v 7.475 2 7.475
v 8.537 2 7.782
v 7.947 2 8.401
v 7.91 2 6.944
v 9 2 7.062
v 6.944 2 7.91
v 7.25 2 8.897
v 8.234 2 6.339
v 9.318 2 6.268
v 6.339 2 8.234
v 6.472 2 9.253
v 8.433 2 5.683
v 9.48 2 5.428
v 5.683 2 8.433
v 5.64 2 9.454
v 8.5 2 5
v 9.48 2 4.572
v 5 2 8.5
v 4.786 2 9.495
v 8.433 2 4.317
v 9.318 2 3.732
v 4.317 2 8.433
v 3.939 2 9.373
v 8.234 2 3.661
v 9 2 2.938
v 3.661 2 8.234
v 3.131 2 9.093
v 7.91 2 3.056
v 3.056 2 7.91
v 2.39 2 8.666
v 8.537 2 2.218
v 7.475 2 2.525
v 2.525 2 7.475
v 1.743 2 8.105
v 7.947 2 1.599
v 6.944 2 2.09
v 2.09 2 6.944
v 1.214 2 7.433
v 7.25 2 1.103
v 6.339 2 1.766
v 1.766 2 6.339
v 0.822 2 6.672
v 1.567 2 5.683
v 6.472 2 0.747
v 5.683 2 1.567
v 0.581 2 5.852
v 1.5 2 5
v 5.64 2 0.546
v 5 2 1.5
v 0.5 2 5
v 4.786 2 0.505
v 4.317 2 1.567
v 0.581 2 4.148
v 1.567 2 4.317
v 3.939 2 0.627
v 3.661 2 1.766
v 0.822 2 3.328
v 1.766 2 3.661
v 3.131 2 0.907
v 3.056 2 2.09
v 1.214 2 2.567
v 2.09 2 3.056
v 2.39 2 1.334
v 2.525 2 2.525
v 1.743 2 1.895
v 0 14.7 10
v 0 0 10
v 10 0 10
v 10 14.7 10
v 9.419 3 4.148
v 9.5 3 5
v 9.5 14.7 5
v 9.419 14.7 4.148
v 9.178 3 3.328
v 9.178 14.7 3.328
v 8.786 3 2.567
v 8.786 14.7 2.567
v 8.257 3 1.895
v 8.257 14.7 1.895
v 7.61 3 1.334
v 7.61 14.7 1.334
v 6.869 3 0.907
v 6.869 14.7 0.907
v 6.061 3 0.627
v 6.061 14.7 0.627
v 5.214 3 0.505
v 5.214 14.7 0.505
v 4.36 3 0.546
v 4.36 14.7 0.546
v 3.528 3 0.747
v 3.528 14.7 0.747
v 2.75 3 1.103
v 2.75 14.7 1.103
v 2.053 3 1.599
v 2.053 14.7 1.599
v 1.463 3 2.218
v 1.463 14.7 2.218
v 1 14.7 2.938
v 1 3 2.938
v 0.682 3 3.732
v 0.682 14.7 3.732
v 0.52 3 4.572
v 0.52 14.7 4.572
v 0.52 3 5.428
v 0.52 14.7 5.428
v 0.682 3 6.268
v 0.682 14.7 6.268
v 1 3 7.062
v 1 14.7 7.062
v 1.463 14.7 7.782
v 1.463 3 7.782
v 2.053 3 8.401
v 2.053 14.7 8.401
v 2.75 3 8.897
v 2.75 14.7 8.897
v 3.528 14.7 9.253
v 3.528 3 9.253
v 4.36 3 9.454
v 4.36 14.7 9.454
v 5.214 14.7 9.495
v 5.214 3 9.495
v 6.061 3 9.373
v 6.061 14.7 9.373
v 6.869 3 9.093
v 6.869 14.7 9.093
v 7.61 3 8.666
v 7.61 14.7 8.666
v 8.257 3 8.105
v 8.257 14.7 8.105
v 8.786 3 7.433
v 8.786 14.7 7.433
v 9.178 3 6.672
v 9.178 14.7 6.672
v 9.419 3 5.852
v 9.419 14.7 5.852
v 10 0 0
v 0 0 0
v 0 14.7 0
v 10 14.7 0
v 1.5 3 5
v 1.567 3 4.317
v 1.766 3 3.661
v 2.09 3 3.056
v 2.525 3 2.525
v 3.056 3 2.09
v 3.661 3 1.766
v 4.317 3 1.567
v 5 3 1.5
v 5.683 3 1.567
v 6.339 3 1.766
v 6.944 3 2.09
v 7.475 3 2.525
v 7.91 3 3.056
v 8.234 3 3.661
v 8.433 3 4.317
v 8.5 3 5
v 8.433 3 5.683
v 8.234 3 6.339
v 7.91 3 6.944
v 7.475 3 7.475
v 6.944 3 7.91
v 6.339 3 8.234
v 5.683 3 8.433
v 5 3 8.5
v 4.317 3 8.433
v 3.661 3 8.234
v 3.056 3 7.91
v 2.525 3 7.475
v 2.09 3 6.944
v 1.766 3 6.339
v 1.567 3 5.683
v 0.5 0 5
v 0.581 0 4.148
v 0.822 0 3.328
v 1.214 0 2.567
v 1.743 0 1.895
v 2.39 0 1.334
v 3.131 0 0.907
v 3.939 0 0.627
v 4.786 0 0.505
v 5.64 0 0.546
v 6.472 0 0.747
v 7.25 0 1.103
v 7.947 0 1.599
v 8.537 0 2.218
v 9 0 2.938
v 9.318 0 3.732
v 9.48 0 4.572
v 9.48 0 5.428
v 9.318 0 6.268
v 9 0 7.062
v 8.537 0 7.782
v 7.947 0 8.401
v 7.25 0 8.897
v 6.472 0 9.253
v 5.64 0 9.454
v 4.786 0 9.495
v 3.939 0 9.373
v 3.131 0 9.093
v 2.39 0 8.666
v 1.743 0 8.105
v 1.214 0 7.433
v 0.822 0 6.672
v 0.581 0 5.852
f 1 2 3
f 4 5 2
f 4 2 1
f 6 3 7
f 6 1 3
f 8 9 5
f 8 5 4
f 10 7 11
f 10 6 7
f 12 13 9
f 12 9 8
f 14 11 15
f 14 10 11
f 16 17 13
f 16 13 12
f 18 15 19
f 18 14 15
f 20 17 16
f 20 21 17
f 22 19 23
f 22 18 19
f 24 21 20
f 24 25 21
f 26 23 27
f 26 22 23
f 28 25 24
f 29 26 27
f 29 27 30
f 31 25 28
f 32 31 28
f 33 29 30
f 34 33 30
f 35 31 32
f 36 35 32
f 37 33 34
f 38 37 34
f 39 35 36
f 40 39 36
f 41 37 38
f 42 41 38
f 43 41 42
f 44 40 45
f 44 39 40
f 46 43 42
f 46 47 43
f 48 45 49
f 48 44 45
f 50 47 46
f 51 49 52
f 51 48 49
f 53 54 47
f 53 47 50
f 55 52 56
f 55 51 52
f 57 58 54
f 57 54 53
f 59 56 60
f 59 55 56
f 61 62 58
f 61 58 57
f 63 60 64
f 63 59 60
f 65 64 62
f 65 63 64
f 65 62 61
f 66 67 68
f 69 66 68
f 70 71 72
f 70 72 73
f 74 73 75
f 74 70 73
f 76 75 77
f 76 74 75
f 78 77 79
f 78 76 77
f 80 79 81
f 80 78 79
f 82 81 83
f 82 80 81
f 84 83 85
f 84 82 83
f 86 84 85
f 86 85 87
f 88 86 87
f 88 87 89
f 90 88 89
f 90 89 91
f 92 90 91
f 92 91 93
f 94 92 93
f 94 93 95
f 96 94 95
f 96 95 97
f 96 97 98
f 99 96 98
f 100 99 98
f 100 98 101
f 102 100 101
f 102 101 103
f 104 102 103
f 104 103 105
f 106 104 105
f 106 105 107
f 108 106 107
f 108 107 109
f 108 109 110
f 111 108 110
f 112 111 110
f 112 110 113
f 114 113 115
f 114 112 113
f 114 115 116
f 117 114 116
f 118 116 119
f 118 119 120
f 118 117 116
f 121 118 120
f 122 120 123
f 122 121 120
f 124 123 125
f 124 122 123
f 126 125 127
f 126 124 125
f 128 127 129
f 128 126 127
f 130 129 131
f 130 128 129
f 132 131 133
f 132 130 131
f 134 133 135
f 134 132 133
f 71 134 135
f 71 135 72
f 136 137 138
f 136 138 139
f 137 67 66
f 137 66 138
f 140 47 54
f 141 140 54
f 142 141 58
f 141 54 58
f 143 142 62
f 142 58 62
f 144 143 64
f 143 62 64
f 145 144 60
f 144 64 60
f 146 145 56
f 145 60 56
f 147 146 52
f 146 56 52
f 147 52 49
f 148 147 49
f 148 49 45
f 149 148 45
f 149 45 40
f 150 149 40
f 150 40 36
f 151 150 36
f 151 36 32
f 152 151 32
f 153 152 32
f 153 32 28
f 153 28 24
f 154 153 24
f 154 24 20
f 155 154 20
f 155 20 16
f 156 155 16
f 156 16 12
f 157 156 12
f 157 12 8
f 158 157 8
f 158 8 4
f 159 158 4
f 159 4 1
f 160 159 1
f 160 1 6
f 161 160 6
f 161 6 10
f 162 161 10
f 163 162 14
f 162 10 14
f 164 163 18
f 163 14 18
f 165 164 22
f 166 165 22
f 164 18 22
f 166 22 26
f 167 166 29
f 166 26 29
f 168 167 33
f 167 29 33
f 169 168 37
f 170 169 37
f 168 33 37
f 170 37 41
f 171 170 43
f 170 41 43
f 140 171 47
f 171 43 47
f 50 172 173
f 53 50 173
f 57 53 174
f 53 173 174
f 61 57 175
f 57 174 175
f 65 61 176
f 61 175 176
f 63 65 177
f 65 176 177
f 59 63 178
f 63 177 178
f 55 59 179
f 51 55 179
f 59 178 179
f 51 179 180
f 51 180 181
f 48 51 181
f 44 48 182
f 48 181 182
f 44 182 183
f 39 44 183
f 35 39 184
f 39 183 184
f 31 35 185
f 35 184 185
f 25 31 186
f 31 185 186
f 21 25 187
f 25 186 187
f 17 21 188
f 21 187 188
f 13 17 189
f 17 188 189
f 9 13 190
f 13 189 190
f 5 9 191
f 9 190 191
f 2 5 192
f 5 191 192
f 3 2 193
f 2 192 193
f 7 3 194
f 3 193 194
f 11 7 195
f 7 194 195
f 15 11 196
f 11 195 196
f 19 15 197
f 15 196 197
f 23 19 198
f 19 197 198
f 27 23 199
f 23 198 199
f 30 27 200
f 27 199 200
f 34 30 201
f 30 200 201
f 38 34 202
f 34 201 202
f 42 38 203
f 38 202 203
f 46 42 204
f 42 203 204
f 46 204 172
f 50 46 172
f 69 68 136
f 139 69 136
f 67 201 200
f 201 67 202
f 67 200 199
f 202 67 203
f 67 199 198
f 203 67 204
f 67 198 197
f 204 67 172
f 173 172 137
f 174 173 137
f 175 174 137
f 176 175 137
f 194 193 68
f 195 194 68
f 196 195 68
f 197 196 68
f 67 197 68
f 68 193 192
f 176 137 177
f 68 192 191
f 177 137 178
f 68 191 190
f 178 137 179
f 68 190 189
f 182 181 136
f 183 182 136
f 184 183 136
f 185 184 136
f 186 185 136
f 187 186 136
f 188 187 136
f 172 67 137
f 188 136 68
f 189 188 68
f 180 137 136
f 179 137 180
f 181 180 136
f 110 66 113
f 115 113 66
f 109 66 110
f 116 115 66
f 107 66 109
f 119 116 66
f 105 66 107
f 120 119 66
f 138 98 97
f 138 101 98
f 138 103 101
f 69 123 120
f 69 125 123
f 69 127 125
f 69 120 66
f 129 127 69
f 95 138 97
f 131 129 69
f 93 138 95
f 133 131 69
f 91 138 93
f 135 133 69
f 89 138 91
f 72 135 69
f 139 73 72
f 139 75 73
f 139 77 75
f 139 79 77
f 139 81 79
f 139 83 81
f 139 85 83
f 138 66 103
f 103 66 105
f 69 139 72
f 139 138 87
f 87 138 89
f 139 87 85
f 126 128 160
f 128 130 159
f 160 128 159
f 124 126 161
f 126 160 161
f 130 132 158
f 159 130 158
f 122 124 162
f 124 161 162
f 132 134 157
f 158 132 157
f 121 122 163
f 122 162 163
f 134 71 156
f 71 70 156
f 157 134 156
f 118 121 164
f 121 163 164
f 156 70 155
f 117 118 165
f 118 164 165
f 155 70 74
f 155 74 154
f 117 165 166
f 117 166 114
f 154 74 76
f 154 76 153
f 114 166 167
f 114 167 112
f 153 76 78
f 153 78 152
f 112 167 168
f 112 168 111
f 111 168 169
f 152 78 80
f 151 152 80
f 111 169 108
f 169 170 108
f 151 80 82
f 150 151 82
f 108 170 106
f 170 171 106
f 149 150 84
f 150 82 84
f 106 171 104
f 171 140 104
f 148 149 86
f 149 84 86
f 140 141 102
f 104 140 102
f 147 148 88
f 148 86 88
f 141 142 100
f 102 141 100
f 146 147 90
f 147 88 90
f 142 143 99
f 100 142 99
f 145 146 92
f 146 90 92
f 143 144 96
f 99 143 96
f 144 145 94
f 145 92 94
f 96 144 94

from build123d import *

# Parameters (mm, degrees)
SKETCH1_W           = 10
SKETCH1_H           = 10
SKETCH1_R           = 4.5
BOSS_EXTRUDE1_DEPTH = 14.7
SKETCH2_W           = 10
SKETCH2_H           = 10
SKETCH2_R           = 3.5
BOSS_EXTRUDE2_DEPTH = 3
SKETCH3_R           = 4.5
CUT_EXTRUDE1_DEPTH  = 2


with BuildPart() as part:
    # Sketch1 → Boss-Extrude1 (new body)
    with BuildSketch(Plane(origin=(0, 0, 0), x_dir=(1, 0, 0), z_dir=(0, 1, 0))):
        with Locations((5, -5)):
            Rectangle(SKETCH1_W, SKETCH1_H)
        with Locations((5, -5)):
            Circle(SKETCH1_R, mode=Mode.SUBTRACT)
    extrude(amount=BOSS_EXTRUDE1_DEPTH)

    # Sketch2 → Boss-Extrude2 (add)
    with BuildSketch(Plane(origin=(0, 0, 0), x_dir=(-1, 0, 0), z_dir=(0, -1, 0))):
        with Locations((-5, -5)):
            Rectangle(SKETCH2_W, SKETCH2_H)
        with Locations((-5, -5)):
            Circle(SKETCH2_R, mode=Mode.SUBTRACT)
    extrude(amount=-BOSS_EXTRUDE2_DEPTH)

    # Sketch3 → Cut-Extrude1 (cut)
    with BuildSketch(Plane(origin=(0, 0, 0), x_dir=(-1, 0, 0), z_dir=(0, -1, 0))):
        with Locations((-5, -5)):
            Circle(SKETCH3_R)
    extrude(amount=-CUT_EXTRUDE1_DEPTH, mode=Mode.SUBTRACT)


solid = part.part
